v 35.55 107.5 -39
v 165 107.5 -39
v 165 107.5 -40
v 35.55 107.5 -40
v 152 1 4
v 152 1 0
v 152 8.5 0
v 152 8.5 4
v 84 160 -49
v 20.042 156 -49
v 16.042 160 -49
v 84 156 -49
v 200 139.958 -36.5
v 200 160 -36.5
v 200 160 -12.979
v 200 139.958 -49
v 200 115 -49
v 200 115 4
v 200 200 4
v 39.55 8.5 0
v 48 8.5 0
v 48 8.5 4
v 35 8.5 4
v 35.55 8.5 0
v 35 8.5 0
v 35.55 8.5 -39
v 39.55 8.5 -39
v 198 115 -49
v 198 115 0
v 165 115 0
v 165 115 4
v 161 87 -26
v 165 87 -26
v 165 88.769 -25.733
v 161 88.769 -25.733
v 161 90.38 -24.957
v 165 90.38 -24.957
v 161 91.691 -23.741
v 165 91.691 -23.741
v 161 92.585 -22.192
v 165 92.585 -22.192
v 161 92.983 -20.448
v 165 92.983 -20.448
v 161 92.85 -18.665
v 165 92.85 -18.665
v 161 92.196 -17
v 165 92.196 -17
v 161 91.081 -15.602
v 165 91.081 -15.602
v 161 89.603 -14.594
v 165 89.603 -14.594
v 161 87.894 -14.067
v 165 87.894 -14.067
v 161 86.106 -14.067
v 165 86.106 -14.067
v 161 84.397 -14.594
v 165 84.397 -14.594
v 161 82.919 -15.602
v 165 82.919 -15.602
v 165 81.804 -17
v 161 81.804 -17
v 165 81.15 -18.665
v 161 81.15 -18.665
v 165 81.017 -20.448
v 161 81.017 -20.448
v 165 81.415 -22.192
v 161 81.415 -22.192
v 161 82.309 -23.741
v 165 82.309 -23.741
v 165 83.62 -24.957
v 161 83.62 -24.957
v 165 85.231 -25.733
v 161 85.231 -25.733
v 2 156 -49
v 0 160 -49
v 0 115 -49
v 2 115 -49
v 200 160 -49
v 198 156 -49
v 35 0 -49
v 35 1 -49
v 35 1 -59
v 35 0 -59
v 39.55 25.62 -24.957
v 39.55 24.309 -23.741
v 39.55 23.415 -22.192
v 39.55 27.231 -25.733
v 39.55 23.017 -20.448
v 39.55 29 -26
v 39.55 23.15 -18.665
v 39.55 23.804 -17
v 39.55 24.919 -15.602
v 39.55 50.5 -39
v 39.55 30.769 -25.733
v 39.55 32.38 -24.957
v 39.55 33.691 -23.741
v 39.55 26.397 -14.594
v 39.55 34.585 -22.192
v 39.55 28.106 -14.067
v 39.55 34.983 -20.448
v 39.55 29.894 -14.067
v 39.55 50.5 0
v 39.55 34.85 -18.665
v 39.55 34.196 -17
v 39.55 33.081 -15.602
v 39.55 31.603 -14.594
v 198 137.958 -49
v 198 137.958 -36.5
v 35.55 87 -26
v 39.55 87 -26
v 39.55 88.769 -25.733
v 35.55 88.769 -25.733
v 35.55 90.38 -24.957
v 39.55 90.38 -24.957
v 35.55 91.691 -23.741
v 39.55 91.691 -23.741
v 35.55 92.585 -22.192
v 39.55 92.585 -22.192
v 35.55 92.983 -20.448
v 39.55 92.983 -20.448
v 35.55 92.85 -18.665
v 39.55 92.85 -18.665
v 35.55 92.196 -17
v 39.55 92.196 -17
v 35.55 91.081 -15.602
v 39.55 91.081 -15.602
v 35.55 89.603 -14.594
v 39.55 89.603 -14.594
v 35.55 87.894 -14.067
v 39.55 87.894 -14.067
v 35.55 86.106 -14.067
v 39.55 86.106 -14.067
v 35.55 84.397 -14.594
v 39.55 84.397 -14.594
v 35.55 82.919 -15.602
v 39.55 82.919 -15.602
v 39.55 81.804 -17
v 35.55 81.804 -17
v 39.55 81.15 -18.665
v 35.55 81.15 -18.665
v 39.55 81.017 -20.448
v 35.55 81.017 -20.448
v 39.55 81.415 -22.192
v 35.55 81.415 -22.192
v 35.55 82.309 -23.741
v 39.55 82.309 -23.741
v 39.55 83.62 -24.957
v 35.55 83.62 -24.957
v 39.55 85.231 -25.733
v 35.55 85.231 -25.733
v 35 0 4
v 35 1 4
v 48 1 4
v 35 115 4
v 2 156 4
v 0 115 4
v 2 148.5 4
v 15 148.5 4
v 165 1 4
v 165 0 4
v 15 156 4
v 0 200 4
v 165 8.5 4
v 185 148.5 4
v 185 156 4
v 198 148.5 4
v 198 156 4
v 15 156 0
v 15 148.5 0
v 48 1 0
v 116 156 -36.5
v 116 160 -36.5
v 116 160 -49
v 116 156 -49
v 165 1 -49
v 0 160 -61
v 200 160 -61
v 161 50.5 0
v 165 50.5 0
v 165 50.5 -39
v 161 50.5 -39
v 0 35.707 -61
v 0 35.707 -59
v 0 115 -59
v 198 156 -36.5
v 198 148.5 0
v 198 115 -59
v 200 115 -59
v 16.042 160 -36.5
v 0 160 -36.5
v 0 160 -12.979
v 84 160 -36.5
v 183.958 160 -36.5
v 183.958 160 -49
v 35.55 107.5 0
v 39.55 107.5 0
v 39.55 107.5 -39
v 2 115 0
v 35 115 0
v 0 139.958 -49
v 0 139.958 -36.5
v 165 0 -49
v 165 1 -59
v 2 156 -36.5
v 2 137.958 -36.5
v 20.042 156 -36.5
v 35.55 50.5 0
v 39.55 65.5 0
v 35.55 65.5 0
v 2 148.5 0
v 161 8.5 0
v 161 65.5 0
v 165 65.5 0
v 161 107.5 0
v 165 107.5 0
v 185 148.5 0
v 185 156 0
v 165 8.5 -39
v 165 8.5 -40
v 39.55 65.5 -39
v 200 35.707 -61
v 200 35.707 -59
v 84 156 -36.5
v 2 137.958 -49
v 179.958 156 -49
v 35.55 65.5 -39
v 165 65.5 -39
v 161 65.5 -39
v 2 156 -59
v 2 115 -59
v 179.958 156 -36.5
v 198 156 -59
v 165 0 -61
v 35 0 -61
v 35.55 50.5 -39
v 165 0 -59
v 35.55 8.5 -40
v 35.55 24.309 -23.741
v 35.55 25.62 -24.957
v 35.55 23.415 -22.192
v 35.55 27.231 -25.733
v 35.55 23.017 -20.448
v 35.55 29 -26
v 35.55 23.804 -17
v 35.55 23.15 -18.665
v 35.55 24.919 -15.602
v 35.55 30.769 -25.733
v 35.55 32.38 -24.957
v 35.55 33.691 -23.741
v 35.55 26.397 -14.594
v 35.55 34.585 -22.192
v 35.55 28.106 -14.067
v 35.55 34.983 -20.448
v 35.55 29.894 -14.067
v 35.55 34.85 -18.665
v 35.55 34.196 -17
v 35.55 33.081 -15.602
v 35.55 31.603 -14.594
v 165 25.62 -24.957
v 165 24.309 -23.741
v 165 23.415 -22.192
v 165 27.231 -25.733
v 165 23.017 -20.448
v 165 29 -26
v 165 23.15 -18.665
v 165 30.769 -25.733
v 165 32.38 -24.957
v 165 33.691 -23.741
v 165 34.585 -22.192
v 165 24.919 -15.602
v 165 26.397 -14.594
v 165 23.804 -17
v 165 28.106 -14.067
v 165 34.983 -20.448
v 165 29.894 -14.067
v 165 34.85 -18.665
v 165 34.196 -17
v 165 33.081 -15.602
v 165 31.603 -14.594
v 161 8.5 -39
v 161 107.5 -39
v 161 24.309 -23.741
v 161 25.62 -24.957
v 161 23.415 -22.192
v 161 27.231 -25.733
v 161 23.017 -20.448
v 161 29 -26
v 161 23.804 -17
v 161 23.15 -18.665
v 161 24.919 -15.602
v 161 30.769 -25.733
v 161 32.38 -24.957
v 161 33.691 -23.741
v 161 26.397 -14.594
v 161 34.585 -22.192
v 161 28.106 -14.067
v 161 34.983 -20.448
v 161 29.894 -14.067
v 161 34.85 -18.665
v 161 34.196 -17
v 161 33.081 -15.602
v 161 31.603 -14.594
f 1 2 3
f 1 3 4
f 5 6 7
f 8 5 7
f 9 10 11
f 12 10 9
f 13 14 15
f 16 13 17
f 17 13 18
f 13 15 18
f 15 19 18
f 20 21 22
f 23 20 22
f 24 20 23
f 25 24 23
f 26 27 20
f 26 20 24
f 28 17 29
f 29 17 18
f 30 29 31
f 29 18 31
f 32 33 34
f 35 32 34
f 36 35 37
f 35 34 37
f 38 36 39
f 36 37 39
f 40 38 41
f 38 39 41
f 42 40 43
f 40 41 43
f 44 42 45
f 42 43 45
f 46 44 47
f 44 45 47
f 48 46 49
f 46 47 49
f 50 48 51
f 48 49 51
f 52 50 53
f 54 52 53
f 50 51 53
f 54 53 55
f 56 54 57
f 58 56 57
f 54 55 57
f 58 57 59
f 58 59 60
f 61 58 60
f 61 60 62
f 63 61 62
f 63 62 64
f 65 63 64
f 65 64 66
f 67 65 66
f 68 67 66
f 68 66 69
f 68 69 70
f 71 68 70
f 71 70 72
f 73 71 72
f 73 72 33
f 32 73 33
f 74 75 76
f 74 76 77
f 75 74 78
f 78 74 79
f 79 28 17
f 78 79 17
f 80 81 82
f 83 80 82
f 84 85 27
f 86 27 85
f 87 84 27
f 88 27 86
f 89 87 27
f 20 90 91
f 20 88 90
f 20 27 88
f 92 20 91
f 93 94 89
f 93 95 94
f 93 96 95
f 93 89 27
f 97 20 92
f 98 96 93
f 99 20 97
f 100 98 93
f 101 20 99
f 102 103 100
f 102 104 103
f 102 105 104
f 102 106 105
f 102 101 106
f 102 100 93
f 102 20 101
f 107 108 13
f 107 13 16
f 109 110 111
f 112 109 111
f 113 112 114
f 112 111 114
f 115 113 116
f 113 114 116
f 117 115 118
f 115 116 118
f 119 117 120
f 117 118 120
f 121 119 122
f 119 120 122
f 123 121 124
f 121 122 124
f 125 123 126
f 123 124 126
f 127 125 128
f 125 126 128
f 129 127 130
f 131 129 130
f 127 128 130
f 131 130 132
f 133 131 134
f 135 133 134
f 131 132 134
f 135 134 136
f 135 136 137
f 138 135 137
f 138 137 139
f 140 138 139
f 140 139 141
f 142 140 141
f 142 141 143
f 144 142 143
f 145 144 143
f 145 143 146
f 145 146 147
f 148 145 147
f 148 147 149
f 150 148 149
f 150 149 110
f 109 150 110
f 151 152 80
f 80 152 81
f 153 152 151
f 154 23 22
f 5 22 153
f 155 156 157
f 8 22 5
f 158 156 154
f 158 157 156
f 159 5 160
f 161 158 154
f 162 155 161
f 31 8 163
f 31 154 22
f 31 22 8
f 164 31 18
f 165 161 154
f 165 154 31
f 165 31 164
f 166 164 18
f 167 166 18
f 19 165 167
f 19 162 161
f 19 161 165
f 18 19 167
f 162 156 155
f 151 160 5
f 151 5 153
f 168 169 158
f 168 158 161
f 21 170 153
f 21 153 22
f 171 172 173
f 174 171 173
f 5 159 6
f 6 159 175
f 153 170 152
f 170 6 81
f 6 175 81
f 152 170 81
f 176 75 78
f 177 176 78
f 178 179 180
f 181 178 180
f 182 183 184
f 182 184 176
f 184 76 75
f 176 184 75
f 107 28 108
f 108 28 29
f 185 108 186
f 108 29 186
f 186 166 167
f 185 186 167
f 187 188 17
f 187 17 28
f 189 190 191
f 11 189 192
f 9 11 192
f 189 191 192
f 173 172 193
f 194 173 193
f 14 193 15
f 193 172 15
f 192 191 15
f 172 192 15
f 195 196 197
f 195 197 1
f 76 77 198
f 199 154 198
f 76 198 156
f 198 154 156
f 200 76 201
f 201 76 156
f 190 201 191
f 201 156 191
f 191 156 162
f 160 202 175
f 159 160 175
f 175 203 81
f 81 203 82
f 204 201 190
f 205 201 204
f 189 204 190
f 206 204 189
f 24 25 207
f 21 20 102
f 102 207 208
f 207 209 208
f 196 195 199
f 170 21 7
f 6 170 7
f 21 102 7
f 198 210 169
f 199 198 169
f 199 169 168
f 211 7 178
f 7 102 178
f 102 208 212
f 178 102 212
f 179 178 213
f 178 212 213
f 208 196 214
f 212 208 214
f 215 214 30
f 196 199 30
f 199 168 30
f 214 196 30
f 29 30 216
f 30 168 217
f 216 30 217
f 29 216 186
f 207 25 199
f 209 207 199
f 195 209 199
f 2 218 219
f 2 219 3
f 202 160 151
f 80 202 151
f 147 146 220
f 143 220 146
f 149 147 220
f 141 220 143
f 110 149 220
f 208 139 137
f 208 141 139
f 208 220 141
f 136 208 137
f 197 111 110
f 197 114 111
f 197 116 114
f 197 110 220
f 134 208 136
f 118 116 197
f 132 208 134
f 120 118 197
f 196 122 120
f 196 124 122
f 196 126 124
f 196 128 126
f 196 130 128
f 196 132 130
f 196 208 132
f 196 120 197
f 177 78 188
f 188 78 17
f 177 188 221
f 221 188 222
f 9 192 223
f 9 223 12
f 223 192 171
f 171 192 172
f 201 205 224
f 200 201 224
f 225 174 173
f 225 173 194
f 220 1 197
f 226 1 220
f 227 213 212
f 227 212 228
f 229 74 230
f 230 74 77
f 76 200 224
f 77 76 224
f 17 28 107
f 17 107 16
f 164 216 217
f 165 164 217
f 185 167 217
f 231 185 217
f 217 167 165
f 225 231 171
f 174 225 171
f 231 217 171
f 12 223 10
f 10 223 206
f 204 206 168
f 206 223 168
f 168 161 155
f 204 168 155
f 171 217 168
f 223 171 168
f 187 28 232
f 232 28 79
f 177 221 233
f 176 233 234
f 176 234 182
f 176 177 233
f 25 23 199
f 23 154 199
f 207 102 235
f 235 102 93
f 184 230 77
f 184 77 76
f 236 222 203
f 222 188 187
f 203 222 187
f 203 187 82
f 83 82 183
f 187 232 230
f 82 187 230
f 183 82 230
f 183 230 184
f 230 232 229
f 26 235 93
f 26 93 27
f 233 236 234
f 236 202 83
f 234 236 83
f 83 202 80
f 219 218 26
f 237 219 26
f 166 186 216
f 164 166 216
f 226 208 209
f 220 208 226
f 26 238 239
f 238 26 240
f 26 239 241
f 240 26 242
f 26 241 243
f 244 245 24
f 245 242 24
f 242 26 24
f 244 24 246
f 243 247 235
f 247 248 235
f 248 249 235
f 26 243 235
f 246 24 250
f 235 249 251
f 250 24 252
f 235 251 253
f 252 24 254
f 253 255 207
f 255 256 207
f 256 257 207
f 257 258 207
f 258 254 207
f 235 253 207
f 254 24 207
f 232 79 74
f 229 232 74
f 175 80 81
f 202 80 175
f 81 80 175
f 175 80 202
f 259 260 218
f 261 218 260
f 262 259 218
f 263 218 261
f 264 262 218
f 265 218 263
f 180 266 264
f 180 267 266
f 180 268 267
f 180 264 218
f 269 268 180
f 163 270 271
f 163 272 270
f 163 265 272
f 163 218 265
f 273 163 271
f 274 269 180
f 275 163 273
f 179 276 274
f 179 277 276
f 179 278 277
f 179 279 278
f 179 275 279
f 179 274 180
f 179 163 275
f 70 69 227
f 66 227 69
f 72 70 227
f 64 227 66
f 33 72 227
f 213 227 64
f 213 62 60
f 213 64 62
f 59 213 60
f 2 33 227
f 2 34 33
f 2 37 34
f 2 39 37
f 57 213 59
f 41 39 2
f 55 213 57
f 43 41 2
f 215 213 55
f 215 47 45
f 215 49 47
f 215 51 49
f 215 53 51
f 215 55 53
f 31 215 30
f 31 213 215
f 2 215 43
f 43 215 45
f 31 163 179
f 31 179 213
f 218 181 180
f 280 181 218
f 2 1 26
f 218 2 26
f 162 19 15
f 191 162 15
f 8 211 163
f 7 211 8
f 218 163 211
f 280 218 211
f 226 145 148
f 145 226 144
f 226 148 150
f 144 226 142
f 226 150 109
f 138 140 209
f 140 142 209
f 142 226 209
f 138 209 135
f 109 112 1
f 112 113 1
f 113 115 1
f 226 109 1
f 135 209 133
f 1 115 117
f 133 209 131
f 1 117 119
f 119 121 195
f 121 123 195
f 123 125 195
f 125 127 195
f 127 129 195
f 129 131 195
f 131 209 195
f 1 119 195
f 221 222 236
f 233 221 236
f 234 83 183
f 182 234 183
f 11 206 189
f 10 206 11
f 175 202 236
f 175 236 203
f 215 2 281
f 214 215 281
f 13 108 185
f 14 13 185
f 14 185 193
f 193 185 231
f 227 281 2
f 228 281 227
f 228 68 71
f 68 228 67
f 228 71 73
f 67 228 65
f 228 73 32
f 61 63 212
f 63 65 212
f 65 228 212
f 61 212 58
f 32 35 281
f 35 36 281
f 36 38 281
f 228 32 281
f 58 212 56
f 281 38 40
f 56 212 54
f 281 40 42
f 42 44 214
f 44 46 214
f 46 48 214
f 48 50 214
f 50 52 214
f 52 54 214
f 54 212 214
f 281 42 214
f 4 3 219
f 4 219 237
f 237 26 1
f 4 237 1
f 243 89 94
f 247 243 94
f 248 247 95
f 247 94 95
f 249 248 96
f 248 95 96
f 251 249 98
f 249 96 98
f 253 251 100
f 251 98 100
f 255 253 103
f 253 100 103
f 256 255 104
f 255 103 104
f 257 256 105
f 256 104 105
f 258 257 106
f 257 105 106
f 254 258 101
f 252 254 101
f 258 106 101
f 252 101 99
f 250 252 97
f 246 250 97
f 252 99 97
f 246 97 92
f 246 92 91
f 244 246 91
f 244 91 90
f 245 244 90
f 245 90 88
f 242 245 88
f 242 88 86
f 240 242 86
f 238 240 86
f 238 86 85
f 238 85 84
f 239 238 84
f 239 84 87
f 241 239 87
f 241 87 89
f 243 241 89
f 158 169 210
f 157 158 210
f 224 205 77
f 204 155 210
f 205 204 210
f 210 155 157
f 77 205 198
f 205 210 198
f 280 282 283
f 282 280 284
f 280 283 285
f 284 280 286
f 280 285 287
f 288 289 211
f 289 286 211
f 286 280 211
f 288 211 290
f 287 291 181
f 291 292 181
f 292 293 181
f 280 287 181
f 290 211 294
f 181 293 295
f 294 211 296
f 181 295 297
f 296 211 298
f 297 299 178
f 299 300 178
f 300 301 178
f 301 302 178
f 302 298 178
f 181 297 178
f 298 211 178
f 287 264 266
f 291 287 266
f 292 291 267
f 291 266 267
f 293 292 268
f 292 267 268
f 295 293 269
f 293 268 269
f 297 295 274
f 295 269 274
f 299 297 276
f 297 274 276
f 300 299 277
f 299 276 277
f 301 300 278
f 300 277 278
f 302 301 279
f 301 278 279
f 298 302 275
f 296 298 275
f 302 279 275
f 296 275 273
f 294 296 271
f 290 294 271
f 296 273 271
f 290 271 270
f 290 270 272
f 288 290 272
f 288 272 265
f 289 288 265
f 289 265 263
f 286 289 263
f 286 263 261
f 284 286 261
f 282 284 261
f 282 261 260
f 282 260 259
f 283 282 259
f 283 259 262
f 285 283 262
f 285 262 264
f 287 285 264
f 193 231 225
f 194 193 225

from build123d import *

# Parameters (mm, degrees)
BOSS_EXTRUDE1_DEPTH    = 4
BOSS_EXTRUDE2_DEPTH    = 53
BOSS_EXTRUDE4_DEPTH    = 200
SKETCH5_W              = 25.514718625
SKETCH5_H              = 12.5
CUT_EXTRUDE1_DEPTH     = 20
SKETCH6_W              = 12.5
SKETCH6_H              = 25.514718626
CUT_EXTRUDE2_DEPTH     = 20
BOSS_EXTRUDE5_DEPTH    = 4
SKETCH9_W              = 4
SKETCH9_H              = 99
BOSS_EXTRUDE6_DEPTH    = 39
SKETCH10_W             = 39
SKETCH10_H             = 15
CUT_EXTRUDE5_DEPTH     = 137
SKETCH12_W             = 35
SKETCH12_H             = 53
CUT_EXTRUDE6_DEPTH     = 8
SKETCH13_R             = 6
CUT_EXTRUDE7_DEPTH     = 135
SKETCH15_W             = 129.449663631
SKETCH15_H             = 99
BOSS_EXTRUDE7_DEPTH    = 1
SPLIT1_SURFACE_1_BACK  = 288.766
SPLIT1_SURFACE_1_DEPTH = 577.532
SPLIT1_SURFACE_2_BACK  = 288.766
SPLIT1_SURFACE_2_DEPTH = 577.532
SKETCH17_W             = 13
SKETCH17_H             = 7.5
CUT_EXTRUDE8_DEPTH     = 10
SKETCH21_W             = 130
SKETCH21_H             = 1
BOSS_EXTRUDE10_DEPTH   = 10
SKETCH23_W             = 32
SKETCH23_H             = 12.5
CUT_EXTRUDE9_DEPTH     = 10
BOSS_EXTRUDE14_DEPTH   = 2
SPLIT2_SURFACE_3_BACK  = 291.215
SPLIT2_SURFACE_3_DEPTH = 582.43
SPLIT2_SURFACE_4_BACK  = 291.215
SPLIT2_SURFACE_4_DEPTH = 582.43


with BuildPart() as part:
    # Sketch1 → Boss-Extrude1 (new body)
    with BuildSketch(Plane.XY):
        Polygon((175.95836944, 160), (24.04163056, 160), (0, 135.95836944), (0, 115), (35, 115), (35, 60), (35, 55), (35, 0), (165, 0), (165, 55), (165, 60), (165, 115), (200, 115), (200, 135.95836944), align=None)
    extrude(amount=BOSS_EXTRUDE1_DEPTH)

    # Sketch3 → Boss-Extrude2 (add)
    with BuildSketch(Plane.XY.offset(4)):
        Polygon((0, 0), (200, 0), (200, 1), (199, 1), (1, 1), (0, 1), align=None)
        Polygon((0, 160), (200, 160), (200, 115), (198, 115), (198, 156), (2, 156), (2, 115), (0, 115), align=None)
    extrude(amount=-BOSS_EXTRUDE2_DEPTH)

    # Sketch4 → Boss-Extrude4 (add)
    with BuildSketch(Plane(origin=(200, 0, 0), x_dir=(0, 0, -1), z_dir=(1, 0, 0))):
        Polygon((-4, 160), (-4, 200), (12.978992648, 160), align=None)
    extrude(amount=-BOSS_EXTRUDE4_DEPTH)

    # Sketch5 → Cut-Extrude1 (cut)
    with BuildSketch(Plane(origin=(-67.97918472, 67.97918472, 0), x_dir=(0.7071067811865505, 0.7071067811865447, 0), z_dir=(-0.7071067811865447, 0.7071067811865505, 0))):
        with Locations((111.722871428, 42.75)):
            Rectangle(SKETCH5_W, SKETCH5_H)
    extrude(amount=CUT_EXTRUDE1_DEPTH, mode=Mode.SUBTRACT)

    # Sketch6 → Cut-Extrude2 (cut)
    with BuildSketch(Plane(origin=(167.97918472, 167.97918472, 0), x_dir=(0, 0, -1), z_dir=(0.7071067811865493, 0.7071067811865458, 0))):
        with Locations((42.75, -29.69848481)):
            Rectangle(SKETCH6_W, SKETCH6_H)
    extrude(amount=CUT_EXTRUDE2_DEPTH, mode=Mode.SUBTRACT)

    # Sketch8 → Boss-Extrude5 (add)
    with BuildSketch(Plane.XY.offset(4)):
        Polygon((20.04163056, 156), (2, 156), (2, 137.95836944), align=None)
        Polygon((179.95836944, 156), (198, 156), (198, 137.95836944), align=None)
    extrude(amount=-BOSS_EXTRUDE5_DEPTH)

    # Sketch9 → Boss-Extrude6 (add)
    with BuildSketch(Plane(origin=(0, 0, 0), x_dir=(-1, 0, 0), z_dir=(0, 0, -1))):
        with Locations((-37.550336369, 58)):
            Rectangle(SKETCH9_W, SKETCH9_H)
        with Locations((-163, 58)):
            Rectangle(SKETCH9_W, SKETCH9_H)
    extrude(amount=BOSS_EXTRUDE6_DEPTH)

    # Sketch10 → Cut-Extrude5 (cut)
    with BuildSketch(Plane(origin=(165, 0, 0), x_dir=(0, 0, -1), z_dir=(1, 0, 0))):
        with Locations((19.5, 58)):
            Rectangle(SKETCH10_W, SKETCH10_H)
    extrude(amount=-CUT_EXTRUDE5_DEPTH, mode=Mode.SUBTRACT)

    # Sketch12 → Cut-Extrude6 (cut)
    with BuildSketch(Plane(origin=(0, 1, 0), x_dir=(1, 0, 0), z_dir=(0, 1, 0))):
        with Locations((17.5, 22.5)):
            Rectangle(SKETCH12_W, SKETCH12_H)
        with Locations((182.5, 22.5)):
            Rectangle(SKETCH12_W, SKETCH12_H)
    extrude(amount=-CUT_EXTRUDE6_DEPTH, mode=Mode.SUBTRACT)

    # Sketch13 → Cut-Extrude7 (cut)
    with BuildSketch(Plane(origin=(165, 0, 0), x_dir=(0, 0, -1), z_dir=(1, 0, 0))):
        with Locations((20, 87)):
            Circle(SKETCH13_R)
        with Locations((20, 29)):
            Circle(SKETCH13_R)
    extrude(amount=-CUT_EXTRUDE7_DEPTH, mode=Mode.SUBTRACT)

    # Sketch15 → Boss-Extrude7 (add)
    with BuildSketch(Plane(origin=(0, 0, -39), x_dir=(-1, 0, 0), z_dir=(0, 0, -1))):
        with Locations((-100.275168185, 58)):
            Rectangle(SKETCH15_W, SKETCH15_H)
    extrude(amount=BOSS_EXTRUDE7_DEPTH)


with BuildPart() as body_2:
    # Split1: the piece behind the surface
    add(part.part)
    # Split1 surface: a surface, the sketch's curves swept straight by 577.532 mm
    with BuildLine(Plane(origin=(165, 0, 0), x_dir=(0, 0, -1), z_dir=(1, 0, 0)).offset(-SPLIT1_SURFACE_1_BACK), mode=Mode.PRIVATE) as split1_surface_1_path:
        Line((39, 107.5), (39, 8.5))
    split1_surface_1 = Shell.extrude(split1_surface_1_path.wire(), (1 * SPLIT1_SURFACE_1_DEPTH, 0 * SPLIT1_SURFACE_1_DEPTH, 0 * SPLIT1_SURFACE_1_DEPTH))
    split(bisect_by=split1_surface_1, keep=Keep.BOTTOM)

    # Sketch17 → Cut-Extrude8 (cut)
    with BuildSketch(Plane(origin=(0, 0, 0), x_dir=(-1, 0, 0), z_dir=(0, 0, -1))):
        with Locations((-191.5, 152.25)):
            Rectangle(SKETCH17_W, SKETCH17_H)
        with Locations((-8.5, 152.25)):
            Rectangle(SKETCH17_W, SKETCH17_H)
        with Locations((-158.5, 4.75)):
            Rectangle(SKETCH17_W, SKETCH17_H)
        with Locations((-41.5, 4.75)):
            Rectangle(SKETCH17_W, SKETCH17_H)
    extrude(amount=-CUT_EXTRUDE8_DEPTH, mode=Mode.SUBTRACT)

    # Sketch21 → Boss-Extrude10 (add)
    with BuildSketch(Plane(origin=(0, 0, -49), x_dir=(-1, 0, 0), z_dir=(0, 0, -1))):
        Polygon((-2, 115), (0, 115), (0, 139.95836944), (-2, 137.95836944), align=None)
        Polygon((-2, 137.95836944), (0, 139.95836944), (0, 160), (-200, 160), (-200, 115), (-198, 115), (-198, 156), (-2, 156), align=None)
        with Locations((-100, 0.5)):
            Rectangle(SKETCH21_W, SKETCH21_H)
    extrude(amount=BOSS_EXTRUDE10_DEPTH)

    # Sketch23 → Cut-Extrude9 (cut)
    with BuildSketch(Plane(origin=(0, 160, 0), x_dir=(1, 0, 0), z_dir=(0, 1, 0))):
        with Locations((100, 42.75)):
            Rectangle(SKETCH23_W, SKETCH23_H)
    extrude(amount=-CUT_EXTRUDE9_DEPTH, mode=Mode.SUBTRACT)

    # Sketch22 → Boss-Extrude14 (add)
    with BuildSketch(Plane(origin=(0, 0, -59), x_dir=(-1, 0, 0), z_dir=(0, 0, -1))):
        Polygon((0, 35.707142143), (0, 115), (-2, 115), (-2, 156), (-198, 156), (-198, 115), (-200, 115), (-200, 35.707142143), (-165, 0), (-35, 0), align=None)
        Polygon((-2, 156), (-2, 115), (0, 115), (0, 160), (-200, 160), (-200, 115), (-198, 115), (-198, 156), align=None)
    extrude(amount=BOSS_EXTRUDE14_DEPTH)


with BuildPart() as part_1:
    add(part.part)

    # Split1: split by a surface, the side it looks to stays
    # Split1 surface: a surface, the sketch's curves swept straight by 577.532 mm
    with BuildLine(Plane(origin=(165, 0, 0), x_dir=(0, 0, -1), z_dir=(1, 0, 0)).offset(-SPLIT1_SURFACE_2_BACK), mode=Mode.PRIVATE) as split1_surface_2_path:
        Line((39, 107.5), (39, 8.5))
    split1_surface_2 = Shell.extrude(split1_surface_2_path.wire(), (1 * SPLIT1_SURFACE_2_DEPTH, 0 * SPLIT1_SURFACE_2_DEPTH, 0 * SPLIT1_SURFACE_2_DEPTH))
    split(bisect_by=split1_surface_2, keep=Keep.TOP)


with BuildPart() as body_3:
    # Split2: the piece behind the surface
    add(body_2.part)
    # Split2 surface: a surface, the sketch's curves swept straight by 582.43 mm
    with BuildLine(Plane(origin=(0, 160, 0), x_dir=(1, 0, 0), z_dir=(0, 1, 0)).offset(-SPLIT2_SURFACE_3_BACK), mode=Mode.PRIVATE) as split2_surface_3_path:
        Line((0, 49), (200, 49))
    split2_surface_3 = Shell.extrude(split2_surface_3_path.wire(), (0 * SPLIT2_SURFACE_3_DEPTH, 1 * SPLIT2_SURFACE_3_DEPTH, 0 * SPLIT2_SURFACE_3_DEPTH))
    split(bisect_by=split2_surface_3, keep=Keep.BOTTOM)


with BuildPart() as body_2_1:
    add(body_2.part)

    # Split2: split by a surface, the side it looks to stays
    # Split2 surface: a surface, the sketch's curves swept straight by 582.43 mm
    with BuildLine(Plane(origin=(0, 160, 0), x_dir=(1, 0, 0), z_dir=(0, 1, 0)).offset(-SPLIT2_SURFACE_4_BACK), mode=Mode.PRIVATE) as split2_surface_4_path:
        Line((0, 49), (200, 49))
    split2_surface_4 = Shell.extrude(split2_surface_4_path.wire(), (0 * SPLIT2_SURFACE_4_DEPTH, 1 * SPLIT2_SURFACE_4_DEPTH, 0 * SPLIT2_SURFACE_4_DEPTH))
    split(bisect_by=split2_surface_4, keep=Keep.TOP)


solid = Compound([part_1.part, body_3.part, body_2_1.part])
